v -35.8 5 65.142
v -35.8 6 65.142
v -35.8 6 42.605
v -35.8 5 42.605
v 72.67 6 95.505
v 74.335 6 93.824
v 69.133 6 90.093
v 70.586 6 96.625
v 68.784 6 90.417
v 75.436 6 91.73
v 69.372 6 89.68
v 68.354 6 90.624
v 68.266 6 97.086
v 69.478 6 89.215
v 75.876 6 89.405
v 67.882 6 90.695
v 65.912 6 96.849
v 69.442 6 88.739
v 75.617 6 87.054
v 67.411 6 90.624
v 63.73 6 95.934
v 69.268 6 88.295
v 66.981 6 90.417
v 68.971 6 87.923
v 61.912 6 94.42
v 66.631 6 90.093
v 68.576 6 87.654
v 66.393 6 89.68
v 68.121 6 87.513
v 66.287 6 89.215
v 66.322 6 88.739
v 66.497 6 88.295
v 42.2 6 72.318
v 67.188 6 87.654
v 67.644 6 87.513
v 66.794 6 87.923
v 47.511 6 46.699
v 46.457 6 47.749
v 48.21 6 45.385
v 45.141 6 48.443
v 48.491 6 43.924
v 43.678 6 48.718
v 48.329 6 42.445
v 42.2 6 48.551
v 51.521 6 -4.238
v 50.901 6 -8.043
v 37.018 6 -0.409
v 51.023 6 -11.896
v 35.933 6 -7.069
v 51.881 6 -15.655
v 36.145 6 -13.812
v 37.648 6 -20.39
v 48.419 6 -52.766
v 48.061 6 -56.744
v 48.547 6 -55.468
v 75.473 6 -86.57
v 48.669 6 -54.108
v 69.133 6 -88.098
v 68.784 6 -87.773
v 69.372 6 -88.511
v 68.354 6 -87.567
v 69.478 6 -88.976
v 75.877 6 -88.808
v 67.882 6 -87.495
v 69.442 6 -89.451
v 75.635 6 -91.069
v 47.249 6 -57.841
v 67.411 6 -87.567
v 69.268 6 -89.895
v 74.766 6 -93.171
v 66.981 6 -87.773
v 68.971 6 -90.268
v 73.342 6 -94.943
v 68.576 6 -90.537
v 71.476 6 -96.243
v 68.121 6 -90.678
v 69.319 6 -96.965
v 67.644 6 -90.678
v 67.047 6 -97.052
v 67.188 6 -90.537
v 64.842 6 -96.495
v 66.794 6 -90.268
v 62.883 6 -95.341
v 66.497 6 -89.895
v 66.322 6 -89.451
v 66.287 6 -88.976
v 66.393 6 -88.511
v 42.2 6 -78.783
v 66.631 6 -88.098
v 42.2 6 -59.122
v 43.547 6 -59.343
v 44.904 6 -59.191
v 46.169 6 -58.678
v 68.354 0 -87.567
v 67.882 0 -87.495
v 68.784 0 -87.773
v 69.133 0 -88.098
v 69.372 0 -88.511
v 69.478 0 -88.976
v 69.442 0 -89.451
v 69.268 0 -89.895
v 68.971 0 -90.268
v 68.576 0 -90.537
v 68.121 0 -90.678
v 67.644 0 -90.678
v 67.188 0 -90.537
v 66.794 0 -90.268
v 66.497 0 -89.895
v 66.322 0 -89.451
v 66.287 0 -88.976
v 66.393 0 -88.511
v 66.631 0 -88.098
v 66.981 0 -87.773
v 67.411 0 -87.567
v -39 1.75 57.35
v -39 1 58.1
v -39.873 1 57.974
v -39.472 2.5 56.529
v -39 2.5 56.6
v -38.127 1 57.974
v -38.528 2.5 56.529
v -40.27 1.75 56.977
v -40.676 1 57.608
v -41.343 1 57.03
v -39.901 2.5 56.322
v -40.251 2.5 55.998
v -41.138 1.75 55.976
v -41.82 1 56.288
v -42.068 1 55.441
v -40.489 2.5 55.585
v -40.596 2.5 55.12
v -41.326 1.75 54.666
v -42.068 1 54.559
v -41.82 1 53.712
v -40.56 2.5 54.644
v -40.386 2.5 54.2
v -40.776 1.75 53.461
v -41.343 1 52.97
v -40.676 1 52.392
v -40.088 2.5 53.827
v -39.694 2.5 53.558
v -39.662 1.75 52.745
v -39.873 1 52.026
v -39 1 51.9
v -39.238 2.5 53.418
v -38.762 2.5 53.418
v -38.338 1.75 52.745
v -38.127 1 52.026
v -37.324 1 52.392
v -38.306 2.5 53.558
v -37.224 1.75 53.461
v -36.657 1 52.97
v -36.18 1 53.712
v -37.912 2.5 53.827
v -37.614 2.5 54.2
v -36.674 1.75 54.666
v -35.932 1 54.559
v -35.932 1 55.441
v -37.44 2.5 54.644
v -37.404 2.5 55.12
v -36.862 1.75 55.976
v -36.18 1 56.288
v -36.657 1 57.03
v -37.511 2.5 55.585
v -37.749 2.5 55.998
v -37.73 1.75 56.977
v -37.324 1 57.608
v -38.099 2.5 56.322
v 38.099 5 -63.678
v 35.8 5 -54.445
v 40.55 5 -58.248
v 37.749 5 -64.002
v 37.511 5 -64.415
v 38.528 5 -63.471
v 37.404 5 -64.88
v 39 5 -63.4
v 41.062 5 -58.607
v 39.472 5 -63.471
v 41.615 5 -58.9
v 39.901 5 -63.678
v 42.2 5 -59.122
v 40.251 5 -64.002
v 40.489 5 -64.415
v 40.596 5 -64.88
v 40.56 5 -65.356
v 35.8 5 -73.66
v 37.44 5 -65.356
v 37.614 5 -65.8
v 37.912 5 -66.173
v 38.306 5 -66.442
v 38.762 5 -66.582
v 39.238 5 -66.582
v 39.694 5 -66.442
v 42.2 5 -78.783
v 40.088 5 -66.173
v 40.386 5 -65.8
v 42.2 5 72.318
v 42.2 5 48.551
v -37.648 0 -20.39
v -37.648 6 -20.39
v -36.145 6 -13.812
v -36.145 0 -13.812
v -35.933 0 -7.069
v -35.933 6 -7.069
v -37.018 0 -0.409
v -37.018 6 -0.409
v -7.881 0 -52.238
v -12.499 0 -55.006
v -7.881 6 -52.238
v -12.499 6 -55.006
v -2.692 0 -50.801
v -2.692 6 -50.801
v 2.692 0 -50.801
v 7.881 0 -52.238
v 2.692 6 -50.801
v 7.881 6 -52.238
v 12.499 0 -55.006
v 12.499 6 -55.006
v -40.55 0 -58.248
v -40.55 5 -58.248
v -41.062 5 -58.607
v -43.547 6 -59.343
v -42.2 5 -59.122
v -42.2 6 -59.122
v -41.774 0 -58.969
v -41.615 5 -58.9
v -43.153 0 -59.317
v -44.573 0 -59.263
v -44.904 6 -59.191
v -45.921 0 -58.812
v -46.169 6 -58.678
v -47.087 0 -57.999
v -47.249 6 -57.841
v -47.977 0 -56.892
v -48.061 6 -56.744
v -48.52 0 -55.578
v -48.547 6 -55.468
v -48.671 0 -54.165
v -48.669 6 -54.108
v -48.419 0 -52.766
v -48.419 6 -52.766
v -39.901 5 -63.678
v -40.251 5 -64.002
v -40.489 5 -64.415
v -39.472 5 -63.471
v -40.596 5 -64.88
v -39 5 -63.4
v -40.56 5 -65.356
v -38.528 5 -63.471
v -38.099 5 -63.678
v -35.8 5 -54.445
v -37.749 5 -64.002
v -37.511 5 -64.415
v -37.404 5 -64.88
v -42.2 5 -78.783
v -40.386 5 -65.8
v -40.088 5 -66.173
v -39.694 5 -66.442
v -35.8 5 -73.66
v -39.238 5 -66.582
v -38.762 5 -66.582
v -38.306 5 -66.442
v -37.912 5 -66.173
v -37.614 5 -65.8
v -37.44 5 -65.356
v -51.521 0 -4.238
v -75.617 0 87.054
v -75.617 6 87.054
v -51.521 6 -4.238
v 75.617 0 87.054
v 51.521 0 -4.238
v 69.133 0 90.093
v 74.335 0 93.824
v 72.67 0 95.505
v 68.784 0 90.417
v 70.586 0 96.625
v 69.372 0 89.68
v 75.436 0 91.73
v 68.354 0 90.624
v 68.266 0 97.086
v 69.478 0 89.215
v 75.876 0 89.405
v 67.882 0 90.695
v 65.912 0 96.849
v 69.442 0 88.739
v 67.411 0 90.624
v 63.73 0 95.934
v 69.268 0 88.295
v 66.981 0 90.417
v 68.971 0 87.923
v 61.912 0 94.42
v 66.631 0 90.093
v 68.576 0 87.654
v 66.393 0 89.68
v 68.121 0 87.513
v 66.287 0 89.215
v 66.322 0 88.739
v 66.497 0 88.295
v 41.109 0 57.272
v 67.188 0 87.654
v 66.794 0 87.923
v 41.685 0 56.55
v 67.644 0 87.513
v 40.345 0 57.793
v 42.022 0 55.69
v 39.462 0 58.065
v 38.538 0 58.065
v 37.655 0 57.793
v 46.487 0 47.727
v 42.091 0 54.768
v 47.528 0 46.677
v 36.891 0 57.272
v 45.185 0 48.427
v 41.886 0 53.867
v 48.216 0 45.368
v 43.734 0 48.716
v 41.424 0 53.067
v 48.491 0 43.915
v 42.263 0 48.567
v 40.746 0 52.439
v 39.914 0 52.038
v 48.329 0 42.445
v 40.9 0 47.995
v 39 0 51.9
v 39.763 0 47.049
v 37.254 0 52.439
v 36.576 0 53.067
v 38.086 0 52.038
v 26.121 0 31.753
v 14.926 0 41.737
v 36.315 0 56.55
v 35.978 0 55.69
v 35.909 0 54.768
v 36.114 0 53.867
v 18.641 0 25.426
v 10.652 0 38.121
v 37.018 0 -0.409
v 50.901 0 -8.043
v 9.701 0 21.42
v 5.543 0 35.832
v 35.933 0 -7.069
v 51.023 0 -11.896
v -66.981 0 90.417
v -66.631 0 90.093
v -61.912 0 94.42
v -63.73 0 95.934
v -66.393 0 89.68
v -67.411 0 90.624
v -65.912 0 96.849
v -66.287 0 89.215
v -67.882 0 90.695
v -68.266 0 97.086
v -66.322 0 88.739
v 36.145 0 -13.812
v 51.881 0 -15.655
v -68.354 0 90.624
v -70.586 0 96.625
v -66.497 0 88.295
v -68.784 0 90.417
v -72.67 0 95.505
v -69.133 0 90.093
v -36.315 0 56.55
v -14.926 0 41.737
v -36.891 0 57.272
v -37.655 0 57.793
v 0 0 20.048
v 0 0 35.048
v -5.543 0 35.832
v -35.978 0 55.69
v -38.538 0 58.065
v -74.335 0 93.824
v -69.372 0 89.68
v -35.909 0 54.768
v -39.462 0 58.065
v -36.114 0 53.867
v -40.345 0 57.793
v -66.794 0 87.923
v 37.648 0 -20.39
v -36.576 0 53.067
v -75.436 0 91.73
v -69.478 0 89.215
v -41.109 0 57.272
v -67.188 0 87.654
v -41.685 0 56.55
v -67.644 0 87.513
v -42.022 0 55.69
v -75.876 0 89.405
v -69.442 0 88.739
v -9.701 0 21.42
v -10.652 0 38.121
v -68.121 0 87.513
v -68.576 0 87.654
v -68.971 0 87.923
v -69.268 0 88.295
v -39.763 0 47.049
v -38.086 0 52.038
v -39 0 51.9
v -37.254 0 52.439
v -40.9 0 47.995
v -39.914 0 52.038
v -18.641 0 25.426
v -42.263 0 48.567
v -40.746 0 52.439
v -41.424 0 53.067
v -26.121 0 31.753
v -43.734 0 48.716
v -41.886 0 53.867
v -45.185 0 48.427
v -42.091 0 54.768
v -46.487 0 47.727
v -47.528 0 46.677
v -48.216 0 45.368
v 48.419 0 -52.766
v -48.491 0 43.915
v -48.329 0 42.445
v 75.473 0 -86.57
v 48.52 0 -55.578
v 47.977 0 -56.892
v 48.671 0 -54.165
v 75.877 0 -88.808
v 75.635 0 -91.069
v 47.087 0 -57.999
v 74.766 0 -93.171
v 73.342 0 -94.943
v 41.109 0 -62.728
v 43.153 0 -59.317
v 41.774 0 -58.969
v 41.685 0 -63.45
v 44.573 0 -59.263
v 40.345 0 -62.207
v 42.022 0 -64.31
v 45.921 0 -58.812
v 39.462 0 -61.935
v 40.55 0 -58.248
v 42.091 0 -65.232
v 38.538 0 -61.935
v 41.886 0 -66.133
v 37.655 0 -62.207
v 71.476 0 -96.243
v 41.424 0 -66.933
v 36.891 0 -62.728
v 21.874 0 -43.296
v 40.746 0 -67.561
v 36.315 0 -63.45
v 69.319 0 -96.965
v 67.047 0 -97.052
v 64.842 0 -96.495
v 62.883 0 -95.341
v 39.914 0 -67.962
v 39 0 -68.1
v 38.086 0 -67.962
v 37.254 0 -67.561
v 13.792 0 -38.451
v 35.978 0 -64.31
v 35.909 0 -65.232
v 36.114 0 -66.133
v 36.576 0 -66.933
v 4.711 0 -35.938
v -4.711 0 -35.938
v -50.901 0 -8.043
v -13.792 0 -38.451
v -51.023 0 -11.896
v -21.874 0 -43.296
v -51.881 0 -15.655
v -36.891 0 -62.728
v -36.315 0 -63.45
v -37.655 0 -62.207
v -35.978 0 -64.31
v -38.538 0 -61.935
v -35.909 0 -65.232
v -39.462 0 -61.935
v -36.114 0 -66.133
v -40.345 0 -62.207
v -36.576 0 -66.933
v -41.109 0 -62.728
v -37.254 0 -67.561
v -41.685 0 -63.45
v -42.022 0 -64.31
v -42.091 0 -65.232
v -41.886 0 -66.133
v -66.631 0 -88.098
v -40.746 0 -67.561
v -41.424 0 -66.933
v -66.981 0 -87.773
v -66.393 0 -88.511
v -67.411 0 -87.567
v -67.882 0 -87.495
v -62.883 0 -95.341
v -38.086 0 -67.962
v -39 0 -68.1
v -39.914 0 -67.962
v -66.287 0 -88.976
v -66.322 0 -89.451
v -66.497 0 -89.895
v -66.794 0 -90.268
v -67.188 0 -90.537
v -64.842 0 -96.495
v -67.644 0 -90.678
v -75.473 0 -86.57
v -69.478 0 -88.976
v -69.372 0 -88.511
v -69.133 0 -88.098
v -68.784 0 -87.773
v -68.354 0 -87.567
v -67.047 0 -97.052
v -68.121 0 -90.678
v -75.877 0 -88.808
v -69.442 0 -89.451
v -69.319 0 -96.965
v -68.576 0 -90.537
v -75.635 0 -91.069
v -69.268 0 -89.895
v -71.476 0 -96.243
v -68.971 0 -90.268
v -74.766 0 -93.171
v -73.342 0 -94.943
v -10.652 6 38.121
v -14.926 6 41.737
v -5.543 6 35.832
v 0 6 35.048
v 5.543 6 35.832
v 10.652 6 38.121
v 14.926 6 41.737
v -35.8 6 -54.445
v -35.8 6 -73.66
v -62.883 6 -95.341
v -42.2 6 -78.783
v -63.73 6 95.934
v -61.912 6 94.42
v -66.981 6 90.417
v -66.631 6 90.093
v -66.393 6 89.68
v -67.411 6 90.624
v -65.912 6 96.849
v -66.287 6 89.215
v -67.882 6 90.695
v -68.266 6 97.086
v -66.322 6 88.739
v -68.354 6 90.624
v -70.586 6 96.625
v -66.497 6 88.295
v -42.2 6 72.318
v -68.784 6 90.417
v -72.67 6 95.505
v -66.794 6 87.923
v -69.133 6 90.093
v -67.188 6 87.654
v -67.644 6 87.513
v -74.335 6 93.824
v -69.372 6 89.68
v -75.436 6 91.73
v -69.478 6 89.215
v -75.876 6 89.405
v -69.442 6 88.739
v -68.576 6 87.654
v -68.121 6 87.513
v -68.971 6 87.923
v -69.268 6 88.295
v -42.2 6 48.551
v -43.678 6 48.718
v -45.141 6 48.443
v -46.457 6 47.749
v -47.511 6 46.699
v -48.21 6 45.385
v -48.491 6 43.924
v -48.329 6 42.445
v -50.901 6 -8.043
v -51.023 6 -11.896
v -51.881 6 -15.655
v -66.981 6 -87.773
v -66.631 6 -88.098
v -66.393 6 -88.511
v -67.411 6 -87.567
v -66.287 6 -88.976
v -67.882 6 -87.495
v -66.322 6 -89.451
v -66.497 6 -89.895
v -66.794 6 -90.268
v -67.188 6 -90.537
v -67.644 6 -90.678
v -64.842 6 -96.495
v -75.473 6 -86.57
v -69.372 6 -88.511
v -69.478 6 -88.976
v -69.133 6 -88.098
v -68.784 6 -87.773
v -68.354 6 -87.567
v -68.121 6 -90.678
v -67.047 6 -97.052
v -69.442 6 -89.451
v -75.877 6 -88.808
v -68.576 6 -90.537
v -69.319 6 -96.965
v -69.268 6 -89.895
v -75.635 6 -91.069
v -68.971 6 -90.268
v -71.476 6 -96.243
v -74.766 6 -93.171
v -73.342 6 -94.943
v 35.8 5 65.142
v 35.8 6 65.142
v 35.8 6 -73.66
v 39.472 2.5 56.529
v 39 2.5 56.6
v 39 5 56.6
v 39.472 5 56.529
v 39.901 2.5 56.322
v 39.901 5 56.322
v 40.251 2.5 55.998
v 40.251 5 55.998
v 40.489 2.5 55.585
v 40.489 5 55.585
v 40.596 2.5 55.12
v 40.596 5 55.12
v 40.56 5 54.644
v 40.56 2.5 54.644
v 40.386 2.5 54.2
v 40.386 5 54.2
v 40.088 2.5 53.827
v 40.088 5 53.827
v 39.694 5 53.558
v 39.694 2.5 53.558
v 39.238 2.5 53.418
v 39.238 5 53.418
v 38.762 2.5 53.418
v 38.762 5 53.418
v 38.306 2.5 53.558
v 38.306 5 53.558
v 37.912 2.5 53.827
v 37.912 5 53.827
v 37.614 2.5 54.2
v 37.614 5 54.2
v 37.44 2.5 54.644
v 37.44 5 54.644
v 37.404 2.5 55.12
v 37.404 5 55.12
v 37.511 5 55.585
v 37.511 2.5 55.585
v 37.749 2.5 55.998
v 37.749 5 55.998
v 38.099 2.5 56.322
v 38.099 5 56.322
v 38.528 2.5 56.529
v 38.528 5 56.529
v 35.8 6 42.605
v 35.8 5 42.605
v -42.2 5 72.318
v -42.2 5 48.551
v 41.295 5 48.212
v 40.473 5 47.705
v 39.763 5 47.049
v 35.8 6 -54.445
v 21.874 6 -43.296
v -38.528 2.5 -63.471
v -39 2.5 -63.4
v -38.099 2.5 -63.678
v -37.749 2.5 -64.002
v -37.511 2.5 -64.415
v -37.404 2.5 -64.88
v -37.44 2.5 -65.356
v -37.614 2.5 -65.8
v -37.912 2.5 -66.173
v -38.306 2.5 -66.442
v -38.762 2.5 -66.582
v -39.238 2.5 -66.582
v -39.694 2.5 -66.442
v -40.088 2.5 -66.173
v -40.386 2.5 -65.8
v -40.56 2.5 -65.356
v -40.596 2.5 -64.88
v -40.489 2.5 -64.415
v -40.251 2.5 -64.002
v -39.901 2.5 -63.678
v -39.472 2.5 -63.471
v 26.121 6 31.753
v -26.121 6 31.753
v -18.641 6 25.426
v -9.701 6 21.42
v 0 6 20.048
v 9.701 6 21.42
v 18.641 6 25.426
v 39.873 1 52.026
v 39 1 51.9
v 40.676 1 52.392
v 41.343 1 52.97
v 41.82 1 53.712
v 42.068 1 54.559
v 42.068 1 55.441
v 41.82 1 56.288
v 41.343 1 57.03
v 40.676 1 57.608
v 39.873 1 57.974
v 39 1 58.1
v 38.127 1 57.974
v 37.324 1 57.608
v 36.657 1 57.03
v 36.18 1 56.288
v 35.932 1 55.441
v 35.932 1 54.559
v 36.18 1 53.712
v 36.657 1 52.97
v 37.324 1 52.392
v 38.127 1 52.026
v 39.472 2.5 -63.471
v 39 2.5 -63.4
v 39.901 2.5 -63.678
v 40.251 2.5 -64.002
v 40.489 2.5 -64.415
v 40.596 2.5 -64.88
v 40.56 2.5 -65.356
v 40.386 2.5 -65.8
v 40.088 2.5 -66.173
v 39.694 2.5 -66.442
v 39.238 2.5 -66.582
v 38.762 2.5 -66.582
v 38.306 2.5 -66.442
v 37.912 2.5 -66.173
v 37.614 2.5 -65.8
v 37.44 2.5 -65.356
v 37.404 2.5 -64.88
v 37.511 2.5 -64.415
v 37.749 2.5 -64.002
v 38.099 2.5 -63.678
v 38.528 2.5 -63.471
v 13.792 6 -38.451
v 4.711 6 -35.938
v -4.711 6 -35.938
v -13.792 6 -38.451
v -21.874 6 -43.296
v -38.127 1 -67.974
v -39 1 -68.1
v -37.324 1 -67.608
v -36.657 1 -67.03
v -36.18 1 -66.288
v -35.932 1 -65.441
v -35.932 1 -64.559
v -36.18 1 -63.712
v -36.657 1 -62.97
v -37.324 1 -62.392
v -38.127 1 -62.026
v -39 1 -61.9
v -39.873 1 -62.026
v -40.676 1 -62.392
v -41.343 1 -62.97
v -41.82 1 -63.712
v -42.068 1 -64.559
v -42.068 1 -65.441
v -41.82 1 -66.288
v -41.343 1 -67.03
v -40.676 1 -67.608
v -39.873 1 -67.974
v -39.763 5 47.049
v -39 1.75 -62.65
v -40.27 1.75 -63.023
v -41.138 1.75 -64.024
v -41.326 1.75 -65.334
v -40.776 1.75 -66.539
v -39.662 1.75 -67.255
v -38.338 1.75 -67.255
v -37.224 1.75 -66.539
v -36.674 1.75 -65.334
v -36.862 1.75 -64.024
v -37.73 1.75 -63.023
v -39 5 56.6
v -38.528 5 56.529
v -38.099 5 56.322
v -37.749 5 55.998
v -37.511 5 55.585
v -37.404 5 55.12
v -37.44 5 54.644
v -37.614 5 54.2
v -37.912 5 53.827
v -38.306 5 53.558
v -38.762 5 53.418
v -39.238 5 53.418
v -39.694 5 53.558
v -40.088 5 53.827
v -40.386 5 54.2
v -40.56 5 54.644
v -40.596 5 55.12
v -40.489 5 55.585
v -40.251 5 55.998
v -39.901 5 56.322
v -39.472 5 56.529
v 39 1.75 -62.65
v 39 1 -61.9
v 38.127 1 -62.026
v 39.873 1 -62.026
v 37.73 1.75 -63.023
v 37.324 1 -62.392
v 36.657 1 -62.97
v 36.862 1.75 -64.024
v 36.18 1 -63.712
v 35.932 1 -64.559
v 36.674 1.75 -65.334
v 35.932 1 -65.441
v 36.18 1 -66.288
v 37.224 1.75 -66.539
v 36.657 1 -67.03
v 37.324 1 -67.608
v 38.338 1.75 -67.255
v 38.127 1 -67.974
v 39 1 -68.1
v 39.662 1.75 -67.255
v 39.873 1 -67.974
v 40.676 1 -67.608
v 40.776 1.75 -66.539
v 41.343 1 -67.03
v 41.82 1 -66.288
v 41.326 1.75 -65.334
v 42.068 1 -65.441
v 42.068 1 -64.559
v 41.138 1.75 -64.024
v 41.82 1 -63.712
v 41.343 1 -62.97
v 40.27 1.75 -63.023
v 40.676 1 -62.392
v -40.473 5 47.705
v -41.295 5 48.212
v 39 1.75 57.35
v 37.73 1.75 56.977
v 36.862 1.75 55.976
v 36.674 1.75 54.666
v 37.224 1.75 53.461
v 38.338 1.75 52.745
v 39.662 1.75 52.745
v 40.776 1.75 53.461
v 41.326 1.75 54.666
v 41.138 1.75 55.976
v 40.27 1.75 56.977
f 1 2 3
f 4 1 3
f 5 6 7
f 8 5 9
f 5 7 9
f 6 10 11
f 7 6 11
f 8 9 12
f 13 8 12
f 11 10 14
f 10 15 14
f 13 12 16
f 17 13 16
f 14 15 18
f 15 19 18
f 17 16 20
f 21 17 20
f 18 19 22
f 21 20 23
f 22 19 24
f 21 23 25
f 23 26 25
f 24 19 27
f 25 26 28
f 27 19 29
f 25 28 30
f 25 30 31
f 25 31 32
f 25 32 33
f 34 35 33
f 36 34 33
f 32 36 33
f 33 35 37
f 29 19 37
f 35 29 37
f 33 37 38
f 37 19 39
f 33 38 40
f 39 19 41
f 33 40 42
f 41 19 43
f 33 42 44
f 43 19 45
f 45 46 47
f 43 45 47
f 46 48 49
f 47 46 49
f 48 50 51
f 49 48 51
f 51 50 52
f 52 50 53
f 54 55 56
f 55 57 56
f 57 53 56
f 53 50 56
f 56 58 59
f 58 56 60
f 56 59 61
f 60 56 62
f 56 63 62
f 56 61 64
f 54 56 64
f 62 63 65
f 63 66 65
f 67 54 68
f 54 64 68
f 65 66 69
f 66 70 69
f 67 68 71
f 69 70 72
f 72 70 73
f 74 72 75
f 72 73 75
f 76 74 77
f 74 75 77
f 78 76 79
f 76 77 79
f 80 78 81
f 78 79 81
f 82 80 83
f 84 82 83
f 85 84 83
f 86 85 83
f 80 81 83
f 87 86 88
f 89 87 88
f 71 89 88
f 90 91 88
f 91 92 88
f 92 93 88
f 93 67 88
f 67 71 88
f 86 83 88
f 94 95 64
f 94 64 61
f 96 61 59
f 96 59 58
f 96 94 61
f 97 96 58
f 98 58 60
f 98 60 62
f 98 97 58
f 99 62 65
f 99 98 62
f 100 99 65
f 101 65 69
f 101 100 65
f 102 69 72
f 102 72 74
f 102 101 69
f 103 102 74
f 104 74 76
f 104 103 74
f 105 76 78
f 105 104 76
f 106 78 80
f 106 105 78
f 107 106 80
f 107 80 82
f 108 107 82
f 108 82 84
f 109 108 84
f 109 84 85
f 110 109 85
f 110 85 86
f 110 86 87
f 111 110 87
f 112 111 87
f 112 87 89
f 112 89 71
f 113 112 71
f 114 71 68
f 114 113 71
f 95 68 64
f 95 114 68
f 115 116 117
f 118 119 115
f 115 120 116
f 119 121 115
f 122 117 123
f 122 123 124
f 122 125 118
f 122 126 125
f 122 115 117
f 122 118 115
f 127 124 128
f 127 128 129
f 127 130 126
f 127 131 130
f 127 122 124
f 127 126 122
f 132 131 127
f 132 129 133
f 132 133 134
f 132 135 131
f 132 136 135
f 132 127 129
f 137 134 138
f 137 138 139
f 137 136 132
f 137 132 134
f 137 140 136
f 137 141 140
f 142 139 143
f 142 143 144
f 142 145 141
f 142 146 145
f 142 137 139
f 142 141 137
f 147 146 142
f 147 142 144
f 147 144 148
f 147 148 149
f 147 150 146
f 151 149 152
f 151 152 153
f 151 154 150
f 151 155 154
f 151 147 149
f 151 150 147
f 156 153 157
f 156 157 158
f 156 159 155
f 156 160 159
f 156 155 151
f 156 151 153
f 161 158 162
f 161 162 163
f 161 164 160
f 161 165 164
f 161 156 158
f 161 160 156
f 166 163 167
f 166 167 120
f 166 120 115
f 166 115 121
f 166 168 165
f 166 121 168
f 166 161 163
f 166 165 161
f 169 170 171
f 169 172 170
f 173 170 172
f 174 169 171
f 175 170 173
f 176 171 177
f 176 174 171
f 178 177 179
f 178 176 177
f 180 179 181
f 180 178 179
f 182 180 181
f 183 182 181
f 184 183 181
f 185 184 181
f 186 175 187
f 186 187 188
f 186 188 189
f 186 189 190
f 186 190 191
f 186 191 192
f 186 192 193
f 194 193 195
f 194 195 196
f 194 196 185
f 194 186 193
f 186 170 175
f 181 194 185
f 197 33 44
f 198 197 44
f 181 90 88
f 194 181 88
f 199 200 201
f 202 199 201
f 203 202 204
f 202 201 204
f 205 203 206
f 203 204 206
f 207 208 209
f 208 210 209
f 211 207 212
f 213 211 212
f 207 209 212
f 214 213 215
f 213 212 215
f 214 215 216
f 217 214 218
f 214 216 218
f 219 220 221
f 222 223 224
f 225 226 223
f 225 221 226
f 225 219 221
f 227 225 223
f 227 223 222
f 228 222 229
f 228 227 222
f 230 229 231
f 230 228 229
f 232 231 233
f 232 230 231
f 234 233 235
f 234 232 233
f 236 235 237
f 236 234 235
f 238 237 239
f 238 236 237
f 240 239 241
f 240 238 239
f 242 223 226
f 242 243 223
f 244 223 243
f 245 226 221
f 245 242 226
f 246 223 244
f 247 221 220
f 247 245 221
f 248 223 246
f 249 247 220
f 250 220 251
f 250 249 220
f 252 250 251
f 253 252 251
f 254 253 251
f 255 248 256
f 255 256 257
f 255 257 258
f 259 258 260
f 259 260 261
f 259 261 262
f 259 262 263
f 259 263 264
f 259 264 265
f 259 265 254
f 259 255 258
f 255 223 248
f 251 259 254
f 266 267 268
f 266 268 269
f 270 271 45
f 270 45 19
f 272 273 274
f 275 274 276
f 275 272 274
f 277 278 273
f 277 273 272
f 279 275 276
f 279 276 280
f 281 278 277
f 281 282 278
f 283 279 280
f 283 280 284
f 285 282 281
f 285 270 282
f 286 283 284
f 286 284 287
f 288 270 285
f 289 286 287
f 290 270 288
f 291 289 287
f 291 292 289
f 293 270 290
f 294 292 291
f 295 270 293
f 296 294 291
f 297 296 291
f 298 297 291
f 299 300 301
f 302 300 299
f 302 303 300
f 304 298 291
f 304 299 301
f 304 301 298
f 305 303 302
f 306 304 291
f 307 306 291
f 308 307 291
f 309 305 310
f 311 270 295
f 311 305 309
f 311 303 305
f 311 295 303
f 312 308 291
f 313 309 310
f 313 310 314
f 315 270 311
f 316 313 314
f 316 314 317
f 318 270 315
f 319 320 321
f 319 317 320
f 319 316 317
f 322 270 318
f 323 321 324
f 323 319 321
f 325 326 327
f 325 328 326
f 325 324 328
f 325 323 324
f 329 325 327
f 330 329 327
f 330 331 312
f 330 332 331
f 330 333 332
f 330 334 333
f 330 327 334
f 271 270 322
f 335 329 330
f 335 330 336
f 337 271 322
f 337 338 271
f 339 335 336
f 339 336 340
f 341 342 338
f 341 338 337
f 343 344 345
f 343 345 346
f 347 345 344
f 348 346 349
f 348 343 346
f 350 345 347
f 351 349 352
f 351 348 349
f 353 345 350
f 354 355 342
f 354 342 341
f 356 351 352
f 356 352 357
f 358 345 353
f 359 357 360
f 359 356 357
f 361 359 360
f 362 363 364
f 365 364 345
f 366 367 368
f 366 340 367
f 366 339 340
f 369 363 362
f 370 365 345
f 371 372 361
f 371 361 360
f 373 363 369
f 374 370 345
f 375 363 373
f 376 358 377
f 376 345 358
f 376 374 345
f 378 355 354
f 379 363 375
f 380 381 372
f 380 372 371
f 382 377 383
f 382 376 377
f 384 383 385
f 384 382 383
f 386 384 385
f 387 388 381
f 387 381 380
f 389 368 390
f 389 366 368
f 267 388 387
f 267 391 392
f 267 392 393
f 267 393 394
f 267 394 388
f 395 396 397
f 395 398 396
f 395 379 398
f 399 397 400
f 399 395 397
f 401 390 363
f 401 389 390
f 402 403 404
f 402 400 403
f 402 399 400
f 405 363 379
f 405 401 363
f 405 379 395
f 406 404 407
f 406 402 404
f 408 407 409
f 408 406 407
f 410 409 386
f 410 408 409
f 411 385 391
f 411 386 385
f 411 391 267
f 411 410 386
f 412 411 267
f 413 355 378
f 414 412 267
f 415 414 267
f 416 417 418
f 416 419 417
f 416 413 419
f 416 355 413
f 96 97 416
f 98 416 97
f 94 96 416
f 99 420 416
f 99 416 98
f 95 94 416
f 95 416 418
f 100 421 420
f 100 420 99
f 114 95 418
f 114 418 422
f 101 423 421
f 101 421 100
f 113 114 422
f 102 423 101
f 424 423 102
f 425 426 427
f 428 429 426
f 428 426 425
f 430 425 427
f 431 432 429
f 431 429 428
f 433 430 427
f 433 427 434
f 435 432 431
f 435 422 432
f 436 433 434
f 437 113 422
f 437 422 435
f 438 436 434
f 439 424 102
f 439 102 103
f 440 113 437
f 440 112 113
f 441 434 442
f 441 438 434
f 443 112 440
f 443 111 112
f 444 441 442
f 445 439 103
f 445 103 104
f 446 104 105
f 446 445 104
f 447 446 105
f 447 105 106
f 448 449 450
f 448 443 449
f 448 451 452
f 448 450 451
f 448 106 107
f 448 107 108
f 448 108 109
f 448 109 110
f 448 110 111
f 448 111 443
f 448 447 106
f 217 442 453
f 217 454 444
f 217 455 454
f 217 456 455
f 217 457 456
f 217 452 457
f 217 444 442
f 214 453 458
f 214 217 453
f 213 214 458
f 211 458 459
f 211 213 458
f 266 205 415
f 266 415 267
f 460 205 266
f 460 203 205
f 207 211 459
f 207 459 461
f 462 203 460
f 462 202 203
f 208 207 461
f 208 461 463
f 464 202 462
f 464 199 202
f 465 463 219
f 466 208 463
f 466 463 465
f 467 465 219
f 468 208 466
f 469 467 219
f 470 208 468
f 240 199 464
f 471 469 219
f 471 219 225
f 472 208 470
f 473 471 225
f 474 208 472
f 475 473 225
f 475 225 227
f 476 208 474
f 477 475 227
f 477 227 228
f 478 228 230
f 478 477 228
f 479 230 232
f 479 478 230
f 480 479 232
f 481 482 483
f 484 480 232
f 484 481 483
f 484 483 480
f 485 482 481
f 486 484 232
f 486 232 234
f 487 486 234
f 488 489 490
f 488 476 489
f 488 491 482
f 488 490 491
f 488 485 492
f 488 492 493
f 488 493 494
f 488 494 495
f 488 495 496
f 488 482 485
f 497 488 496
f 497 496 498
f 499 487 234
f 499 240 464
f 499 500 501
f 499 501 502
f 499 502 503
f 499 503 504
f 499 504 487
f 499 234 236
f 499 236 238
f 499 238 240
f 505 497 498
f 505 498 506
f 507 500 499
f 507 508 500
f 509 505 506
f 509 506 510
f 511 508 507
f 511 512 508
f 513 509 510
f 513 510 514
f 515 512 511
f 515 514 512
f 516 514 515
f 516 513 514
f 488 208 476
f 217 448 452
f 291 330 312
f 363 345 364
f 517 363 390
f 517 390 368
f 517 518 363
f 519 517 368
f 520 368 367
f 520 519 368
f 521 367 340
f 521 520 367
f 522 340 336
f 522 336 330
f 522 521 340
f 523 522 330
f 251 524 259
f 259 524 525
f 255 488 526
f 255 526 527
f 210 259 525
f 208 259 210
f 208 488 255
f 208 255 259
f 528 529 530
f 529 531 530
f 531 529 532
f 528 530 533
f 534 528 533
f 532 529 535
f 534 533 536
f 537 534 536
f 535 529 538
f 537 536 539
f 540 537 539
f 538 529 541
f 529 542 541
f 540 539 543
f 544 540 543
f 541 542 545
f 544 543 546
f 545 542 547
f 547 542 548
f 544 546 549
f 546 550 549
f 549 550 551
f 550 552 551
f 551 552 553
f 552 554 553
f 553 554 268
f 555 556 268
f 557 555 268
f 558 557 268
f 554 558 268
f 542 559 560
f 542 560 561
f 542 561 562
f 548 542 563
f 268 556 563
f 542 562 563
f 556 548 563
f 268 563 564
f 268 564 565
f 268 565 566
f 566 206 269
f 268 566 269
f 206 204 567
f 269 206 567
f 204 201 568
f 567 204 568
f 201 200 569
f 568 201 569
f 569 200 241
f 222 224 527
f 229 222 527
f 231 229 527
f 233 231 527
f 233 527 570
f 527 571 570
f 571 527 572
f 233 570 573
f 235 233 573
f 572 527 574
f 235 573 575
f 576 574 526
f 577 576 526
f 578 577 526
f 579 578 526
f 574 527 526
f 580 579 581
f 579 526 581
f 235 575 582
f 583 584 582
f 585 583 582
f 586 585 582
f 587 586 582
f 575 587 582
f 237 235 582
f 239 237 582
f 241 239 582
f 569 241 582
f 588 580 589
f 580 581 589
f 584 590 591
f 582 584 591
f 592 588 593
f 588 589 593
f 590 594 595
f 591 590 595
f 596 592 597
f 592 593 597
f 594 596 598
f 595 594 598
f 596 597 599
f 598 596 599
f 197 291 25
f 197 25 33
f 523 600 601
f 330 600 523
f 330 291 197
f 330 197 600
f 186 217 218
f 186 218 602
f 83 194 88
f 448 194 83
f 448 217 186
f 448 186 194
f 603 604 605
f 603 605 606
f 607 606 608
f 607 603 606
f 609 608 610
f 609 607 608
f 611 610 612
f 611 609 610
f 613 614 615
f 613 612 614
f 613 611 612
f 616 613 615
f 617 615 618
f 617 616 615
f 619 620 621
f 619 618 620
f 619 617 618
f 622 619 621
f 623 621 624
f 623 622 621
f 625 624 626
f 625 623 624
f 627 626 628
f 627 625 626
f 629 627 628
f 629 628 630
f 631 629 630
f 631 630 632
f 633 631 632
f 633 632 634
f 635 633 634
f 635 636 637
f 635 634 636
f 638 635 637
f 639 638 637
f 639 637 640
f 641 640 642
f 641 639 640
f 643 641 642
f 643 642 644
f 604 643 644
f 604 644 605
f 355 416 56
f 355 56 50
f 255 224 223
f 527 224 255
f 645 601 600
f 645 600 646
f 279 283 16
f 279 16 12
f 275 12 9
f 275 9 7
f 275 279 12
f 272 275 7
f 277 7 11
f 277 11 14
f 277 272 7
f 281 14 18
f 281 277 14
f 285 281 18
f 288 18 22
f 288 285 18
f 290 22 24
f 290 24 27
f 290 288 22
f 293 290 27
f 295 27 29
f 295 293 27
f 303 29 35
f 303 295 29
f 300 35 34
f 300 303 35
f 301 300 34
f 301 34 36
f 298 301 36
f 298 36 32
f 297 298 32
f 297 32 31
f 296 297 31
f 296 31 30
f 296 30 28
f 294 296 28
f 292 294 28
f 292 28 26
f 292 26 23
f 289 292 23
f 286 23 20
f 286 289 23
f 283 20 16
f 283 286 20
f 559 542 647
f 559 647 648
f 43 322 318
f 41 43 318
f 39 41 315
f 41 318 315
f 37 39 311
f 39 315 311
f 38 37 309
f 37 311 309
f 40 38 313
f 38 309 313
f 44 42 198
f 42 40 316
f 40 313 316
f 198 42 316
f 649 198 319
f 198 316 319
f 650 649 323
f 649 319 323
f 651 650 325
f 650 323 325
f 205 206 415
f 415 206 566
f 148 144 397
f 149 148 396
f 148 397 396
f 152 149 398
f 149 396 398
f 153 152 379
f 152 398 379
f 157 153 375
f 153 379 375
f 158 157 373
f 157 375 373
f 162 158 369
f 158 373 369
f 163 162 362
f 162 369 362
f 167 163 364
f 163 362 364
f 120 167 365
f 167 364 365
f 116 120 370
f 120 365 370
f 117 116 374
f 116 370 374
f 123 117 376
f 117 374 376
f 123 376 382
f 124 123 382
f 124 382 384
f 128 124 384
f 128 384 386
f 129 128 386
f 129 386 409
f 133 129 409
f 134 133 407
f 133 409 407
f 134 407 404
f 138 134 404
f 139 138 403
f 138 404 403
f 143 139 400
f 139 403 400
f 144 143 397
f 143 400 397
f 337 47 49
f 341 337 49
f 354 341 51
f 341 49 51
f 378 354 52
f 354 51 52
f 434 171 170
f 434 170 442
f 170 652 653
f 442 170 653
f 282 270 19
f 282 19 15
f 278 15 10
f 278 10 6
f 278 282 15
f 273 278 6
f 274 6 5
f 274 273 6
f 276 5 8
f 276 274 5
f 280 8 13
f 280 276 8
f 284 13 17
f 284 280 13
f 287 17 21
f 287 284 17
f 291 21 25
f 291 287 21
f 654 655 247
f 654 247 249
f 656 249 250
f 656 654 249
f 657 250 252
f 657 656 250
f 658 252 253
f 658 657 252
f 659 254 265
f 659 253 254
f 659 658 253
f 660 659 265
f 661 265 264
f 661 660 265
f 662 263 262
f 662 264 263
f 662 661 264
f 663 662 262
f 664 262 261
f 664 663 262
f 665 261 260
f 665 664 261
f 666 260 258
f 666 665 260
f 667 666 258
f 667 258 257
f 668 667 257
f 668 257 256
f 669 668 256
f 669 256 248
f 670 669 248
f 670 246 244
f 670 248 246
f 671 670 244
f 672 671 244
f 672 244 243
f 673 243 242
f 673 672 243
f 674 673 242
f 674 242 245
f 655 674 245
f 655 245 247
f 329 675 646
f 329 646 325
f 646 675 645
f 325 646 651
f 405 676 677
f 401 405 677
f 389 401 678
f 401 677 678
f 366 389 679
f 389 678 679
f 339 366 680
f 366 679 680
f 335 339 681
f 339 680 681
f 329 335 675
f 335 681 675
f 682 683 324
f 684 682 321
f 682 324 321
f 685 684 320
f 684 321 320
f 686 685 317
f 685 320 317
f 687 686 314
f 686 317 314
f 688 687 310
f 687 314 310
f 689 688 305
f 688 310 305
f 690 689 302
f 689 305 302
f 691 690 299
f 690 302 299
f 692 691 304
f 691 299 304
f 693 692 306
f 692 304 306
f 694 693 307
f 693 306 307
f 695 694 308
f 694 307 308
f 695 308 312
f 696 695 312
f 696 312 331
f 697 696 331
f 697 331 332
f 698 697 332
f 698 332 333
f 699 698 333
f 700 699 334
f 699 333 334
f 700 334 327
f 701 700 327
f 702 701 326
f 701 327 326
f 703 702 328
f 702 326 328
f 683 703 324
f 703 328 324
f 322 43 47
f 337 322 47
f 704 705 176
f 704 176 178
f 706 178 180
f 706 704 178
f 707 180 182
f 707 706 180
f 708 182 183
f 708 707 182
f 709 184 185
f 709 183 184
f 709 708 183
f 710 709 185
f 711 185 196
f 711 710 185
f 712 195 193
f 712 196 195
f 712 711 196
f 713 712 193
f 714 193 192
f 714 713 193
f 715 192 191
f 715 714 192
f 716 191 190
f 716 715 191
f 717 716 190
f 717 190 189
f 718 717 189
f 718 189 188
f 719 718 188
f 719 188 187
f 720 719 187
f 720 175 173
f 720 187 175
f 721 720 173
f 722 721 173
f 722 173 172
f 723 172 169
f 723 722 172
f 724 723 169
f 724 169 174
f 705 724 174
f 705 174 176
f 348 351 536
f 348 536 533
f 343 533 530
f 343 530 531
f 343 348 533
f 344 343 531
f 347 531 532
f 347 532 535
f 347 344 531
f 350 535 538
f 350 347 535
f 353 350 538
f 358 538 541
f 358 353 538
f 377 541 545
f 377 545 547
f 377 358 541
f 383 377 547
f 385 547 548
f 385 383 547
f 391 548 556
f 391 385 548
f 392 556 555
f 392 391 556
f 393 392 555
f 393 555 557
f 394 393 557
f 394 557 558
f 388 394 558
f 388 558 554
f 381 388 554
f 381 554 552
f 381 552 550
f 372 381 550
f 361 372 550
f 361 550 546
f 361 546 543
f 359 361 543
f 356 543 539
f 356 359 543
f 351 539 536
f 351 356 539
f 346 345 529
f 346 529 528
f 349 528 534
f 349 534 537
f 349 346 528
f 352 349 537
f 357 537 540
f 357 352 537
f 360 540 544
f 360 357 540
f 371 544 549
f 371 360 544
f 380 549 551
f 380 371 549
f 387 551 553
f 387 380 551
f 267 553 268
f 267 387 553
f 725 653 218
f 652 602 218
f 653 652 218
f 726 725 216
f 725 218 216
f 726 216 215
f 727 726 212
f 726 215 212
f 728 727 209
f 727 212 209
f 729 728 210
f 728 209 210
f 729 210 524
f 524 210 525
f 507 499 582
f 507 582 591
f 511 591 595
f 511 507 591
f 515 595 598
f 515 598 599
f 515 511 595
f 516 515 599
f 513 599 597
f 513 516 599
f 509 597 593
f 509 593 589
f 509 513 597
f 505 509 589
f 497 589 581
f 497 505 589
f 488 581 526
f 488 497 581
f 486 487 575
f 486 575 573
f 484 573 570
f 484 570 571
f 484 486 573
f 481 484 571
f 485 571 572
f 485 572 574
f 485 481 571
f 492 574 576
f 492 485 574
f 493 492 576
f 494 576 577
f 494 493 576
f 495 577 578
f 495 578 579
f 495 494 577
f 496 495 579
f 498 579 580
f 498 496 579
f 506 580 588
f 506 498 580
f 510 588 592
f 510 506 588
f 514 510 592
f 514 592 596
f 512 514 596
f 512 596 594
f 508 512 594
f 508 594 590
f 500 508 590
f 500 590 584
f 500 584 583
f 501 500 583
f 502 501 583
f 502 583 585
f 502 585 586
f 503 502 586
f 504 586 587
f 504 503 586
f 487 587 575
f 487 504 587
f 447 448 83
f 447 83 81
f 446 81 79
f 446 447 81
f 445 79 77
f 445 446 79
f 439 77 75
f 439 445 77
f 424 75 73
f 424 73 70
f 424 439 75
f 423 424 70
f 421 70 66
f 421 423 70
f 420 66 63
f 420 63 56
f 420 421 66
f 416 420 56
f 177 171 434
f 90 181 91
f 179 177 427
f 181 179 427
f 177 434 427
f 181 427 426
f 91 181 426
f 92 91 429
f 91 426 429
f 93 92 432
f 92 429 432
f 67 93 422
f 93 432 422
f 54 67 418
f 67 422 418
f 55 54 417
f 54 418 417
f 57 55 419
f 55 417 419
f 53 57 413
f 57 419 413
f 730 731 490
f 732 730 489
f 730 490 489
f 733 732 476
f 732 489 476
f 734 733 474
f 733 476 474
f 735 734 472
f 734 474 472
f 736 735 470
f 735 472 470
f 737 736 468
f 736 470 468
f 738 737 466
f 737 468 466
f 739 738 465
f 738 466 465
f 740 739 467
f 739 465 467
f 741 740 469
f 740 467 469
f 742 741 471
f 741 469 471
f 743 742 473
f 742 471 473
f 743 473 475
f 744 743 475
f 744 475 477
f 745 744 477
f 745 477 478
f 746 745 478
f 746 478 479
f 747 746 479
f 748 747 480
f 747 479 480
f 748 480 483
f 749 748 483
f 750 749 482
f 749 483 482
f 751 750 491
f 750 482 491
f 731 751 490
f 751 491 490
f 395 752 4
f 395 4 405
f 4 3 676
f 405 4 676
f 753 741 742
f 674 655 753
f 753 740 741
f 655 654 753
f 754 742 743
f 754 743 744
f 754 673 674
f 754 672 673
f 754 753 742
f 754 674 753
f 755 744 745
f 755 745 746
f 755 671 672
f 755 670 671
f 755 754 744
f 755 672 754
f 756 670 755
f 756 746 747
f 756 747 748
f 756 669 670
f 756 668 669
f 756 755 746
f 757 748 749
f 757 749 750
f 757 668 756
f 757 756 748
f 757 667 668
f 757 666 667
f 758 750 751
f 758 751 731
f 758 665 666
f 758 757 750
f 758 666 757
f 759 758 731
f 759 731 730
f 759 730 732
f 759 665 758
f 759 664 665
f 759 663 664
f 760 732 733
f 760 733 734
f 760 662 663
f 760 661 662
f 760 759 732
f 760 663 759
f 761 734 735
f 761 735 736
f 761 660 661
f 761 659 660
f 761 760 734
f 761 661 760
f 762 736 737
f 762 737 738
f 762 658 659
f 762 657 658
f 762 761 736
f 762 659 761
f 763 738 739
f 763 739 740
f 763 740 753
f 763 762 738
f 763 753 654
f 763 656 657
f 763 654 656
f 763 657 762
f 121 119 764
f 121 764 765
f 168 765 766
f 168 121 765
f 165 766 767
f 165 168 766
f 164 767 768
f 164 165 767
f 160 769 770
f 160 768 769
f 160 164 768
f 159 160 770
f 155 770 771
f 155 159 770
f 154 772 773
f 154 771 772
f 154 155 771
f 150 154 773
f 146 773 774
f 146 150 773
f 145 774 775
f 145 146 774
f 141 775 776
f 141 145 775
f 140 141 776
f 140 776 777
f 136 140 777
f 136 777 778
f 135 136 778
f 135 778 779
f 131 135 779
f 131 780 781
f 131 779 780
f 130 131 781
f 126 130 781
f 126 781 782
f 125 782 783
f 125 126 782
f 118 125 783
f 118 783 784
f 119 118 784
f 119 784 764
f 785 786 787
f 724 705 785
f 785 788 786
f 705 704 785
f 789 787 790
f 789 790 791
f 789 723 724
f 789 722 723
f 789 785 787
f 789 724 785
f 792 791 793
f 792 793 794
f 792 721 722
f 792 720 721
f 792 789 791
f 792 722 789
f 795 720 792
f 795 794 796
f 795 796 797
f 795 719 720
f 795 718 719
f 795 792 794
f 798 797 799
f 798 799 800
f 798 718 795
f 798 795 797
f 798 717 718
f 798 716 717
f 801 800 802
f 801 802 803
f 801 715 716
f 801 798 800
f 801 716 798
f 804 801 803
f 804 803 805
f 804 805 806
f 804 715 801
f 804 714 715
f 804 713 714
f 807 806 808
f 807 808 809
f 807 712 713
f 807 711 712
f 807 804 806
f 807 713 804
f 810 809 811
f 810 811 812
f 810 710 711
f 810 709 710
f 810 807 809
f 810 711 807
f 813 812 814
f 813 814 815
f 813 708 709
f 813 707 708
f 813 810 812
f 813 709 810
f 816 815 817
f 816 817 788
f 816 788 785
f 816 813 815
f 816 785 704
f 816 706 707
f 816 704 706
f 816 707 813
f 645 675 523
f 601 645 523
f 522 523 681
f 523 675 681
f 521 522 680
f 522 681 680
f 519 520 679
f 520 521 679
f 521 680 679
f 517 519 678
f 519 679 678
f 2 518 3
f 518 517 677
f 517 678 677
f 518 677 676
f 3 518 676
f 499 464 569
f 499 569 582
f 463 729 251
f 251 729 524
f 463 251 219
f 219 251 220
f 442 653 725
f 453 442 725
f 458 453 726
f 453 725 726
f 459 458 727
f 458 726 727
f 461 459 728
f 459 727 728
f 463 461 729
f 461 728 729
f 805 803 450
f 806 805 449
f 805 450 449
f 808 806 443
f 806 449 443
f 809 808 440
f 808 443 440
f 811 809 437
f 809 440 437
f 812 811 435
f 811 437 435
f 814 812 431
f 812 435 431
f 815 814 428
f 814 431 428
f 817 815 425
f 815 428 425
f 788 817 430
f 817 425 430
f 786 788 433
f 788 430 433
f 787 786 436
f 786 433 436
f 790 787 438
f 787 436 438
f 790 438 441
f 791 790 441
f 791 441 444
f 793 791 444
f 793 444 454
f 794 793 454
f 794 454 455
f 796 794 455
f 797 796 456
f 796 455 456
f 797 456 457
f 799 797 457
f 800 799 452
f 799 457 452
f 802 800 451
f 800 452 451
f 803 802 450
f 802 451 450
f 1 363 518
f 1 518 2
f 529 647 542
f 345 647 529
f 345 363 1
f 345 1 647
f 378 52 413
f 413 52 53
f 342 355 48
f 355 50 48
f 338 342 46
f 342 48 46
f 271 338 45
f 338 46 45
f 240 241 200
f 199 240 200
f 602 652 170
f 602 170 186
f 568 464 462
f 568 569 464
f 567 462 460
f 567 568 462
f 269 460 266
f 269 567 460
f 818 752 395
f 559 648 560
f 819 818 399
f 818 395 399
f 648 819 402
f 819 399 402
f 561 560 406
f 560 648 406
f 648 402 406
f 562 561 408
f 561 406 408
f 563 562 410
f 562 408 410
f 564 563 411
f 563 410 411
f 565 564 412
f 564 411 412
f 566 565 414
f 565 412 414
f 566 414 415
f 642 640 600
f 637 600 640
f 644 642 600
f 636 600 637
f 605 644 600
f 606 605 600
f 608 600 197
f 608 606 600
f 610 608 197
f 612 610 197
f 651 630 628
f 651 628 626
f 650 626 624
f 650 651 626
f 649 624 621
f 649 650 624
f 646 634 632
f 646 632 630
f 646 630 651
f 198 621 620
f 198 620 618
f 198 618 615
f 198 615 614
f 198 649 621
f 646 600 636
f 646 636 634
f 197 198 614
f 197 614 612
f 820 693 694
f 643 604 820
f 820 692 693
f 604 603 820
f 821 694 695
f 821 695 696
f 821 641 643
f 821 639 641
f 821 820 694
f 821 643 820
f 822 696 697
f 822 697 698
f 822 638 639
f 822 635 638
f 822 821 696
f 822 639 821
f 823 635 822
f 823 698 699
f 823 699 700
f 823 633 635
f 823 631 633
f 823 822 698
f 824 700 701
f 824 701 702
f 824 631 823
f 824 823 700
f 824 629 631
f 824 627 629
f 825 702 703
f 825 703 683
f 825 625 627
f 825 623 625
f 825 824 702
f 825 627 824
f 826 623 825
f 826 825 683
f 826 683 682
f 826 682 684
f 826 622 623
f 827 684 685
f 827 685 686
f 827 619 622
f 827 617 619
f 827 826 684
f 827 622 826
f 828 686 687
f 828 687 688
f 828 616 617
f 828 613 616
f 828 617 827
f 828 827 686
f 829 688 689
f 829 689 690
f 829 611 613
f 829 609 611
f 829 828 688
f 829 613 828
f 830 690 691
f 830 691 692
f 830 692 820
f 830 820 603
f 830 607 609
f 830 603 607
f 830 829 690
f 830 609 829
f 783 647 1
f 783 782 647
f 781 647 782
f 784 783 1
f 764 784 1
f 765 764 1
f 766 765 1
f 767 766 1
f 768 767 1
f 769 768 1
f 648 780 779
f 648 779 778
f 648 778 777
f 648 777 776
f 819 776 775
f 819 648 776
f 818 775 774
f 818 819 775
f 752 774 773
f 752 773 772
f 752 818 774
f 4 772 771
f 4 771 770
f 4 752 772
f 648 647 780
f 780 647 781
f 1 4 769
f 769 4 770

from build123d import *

# Parameters (mm, degrees)
SKETCH1_R           = 1.6
BOSS_EXTRUDE1_DEPTH = 6
FILLET1_R           = 20
CUT_EXTRUDE1_REACH  = 125.376
FILLET4_R           = 5
SKETCH6_W           = 6.4
SKETCH6_H           = 33.317887839
SKETCH6_H_2         = 25.783254567
CUT_EXTRUDE2_DEPTH  = 1
SKETCH7_R           = 3.1
CUT_EXTRUDE3_DEPTH  = 1
CHAMFER1_SIZE       = 1.5


with BuildPart() as part:
    # Sketch1 → Boss-Extrude1 (new body)
    with BuildSketch(Plane(origin=(0, 0, 0), x_dir=(1, 0, 0), z_dir=(0, 1, 0))):
        with BuildLine():
            Line((-62.882592423, 95.340725775), (0, 45))
            Line((0, 45), (62.882592423, 95.340725775))
            ThreePointArc((62.882592423, 95.340725775), (72.454956907, 95.659779271), (75.473207923, 86.570108333))
            Line((75.473207923, 86.570108333), (50, 10))
            Line((50, 10), (75.617337378, -87.053778983))
            ThreePointArc((75.617337378, -87.053778983), (71.66966075, -96.142122248), (61.911734553, -94.420201694))
            Line((61.911734553, -94.420201694), (0, -25))
            Line((0, -25), (-61.911734553, -94.420201694))
            ThreePointArc((-61.911734553, -94.420201694), (-71.66966075, -96.142122248), (-75.617337378, -87.053778983))
            Line((-75.617337378, -87.053778983), (-50, 10))
            Line((-50, 10), (-75.473207923, 86.570108333))
            ThreePointArc((-75.473207923, 86.570108333), (-72.454956907, 95.659779271), (-62.882592423, 95.340725775))
        make_face()
        with Locations(Location((-67.882250994, 89.09545443, 0), (0, 0, 270))):
            Circle(SKETCH1_R, mode=Mode.SUBTRACT)
        with Locations(Location((67.882250994, 89.09545443, 0), (0, 0, 270))):
            Circle(SKETCH1_R, mode=Mode.SUBTRACT)
        with Locations(Location((-67.882250994, -89.09545443, 0), (0, 0, 270))):
            Circle(SKETCH1_R, mode=Mode.SUBTRACT)
        with Locations(Location((67.882250994, -89.09545443, 0), (0, 0, 270))):
            Circle(SKETCH1_R, mode=Mode.SUBTRACT)
        with Locations(Location((-39, 65, 0), (0, 0, 270))):
            Circle(SKETCH1_R, mode=Mode.SUBTRACT)
        with Locations(Location((39, 65, 0), (0, 0, 270))):
            Circle(SKETCH1_R, mode=Mode.SUBTRACT)
        with Locations(Location((39, -55, 0), (0, 0, 270))):
            Circle(SKETCH1_R, mode=Mode.SUBTRACT)
        with Locations(Location((-39, -55, 0), (0, 0, 270))):
            Circle(SKETCH1_R, mode=Mode.SUBTRACT)
    extrude(amount=BOSS_EXTRUDE1_DEPTH)

    # Fillet1
    fillet1_edges = [part.edges().sort_by_distance(p)[0] for p in [
        (0, 3, -45),
        (50, 3, -10),
        (0, 3, 25),
        (-50, 3, -10),
    ]]
    fillet(fillet1_edges, radius=FILLET1_R)

    # Sketch2 → Cut-Extrude1 (cut, up to next)
    with BuildSketch(Plane(origin=(0, 6, 0), x_dir=(1, 0, 0), z_dir=(0, 1, 0)), mode=Mode.PRIVATE) as cut_extrude1_sk1:
        with BuildLine():
            Line((-53.761195119, 68.824044103), (-37.648281191, 20.390114276))
            ThreePointArc((-37.648281191, 20.390114276), (-35.876133945, 10.445731448), (-37.017714824, 0.409395025))
            Line((-37.017714824, 0.409395025), (-53.656219744, -62.627202233))
            Line((-53.656219744, -62.627202233), (-26.12100943, -31.752605236))
            ThreePointArc((-26.12100943, -31.752605236), (0, -20.048374517), (26.12100943, -31.752605236))
            Line((26.12100943, -31.752605236), (53.656219744, -62.627202233))
            Line((53.656219744, -62.627202233), (37.017714824, 0.409395025))
            ThreePointArc((37.017714824, 0.409395025), (35.876133945, 10.445731448), (37.648281191, 20.390114276))
            Line((37.648281191, 20.390114276), (53.761195119, 68.824044103))
            Line((53.761195119, 68.824044103), (21.873506248, 43.296321101))
            ThreePointArc((21.873506248, 43.296321101), (0, 35.619383236), (-21.873506248, 43.296321101))
            Line((-21.873506248, 43.296321101), (-53.761195119, 68.824044103))
        make_face()
    cut_extrude1_tool1 = extrude(cut_extrude1_sk1.sketch, amount=-CUT_EXTRUDE1_REACH, mode=Mode.PRIVATE) & part.part
    add(cut_extrude1_tool1.solids().sort_by_distance((0, 6, -6.295596))[0], mode=Mode.SUBTRACT)

    # Fillet4
    fillet4_edges = [part.edges().sort_by_distance(p)[0] for p in [
        (-53.761195119, 3, -68.824044103),
        (53.761195119, 3, -68.824044103),
        (53.656219744, 3, 62.627202233),
        (-53.656219744, 3, 62.627202233),
    ]]
    fillet(fillet4_edges, radius=FILLET4_R)

    # Sketch6 → Cut-Extrude2 (cut)
    with BuildSketch(Plane(origin=(0, 6, 0), x_dir=(1, 0, 0), z_dir=(0, 1, 0))):
        with Locations((-39, -55.65894392)):
            Rectangle(SKETCH6_W, SKETCH6_H)
        with Locations((39, -55.65894392)):
            Rectangle(SKETCH6_W, SKETCH6_H)
        with Locations((39, 65.891627284)):
            Rectangle(SKETCH6_W, SKETCH6_H_2)
        with Locations((-39, 65.891627284)):
            Rectangle(SKETCH6_W, SKETCH6_H_2)
    extrude(amount=-CUT_EXTRUDE2_DEPTH, mode=Mode.SUBTRACT)

    # Sketch7 → Cut-Extrude3 (cut)
    with BuildSketch(Plane.XZ):
        with Locations(Location((-39, 55, 0), (0, 0, 270))):
            Circle(SKETCH7_R)
        with Locations(Location((39, 55, 0), (0, 0, 270))):
            Circle(SKETCH7_R)
        with Locations(Location((-39, -65, 0), (0, 0, 270))):
            Circle(SKETCH7_R)
        with Locations(Location((39, -65, 0), (0, 0, 270))):
            Circle(SKETCH7_R)
    extrude(amount=-CUT_EXTRUDE3_DEPTH, mode=Mode.SUBTRACT)

    # Chamfer1
    chamfer1_edges = [part.edges().sort_by_distance(p)[0] for p in [
        (-39, 1, 53.4),
        (39, 1, 53.4),
        (-39, 1, -66.6),
        (39, 1, -66.6),
    ]]
    chamfer(chamfer1_edges, length=CHAMFER1_SIZE - 0.0001)  # a hair under: the kernel refuses the full size


solid = part.part
